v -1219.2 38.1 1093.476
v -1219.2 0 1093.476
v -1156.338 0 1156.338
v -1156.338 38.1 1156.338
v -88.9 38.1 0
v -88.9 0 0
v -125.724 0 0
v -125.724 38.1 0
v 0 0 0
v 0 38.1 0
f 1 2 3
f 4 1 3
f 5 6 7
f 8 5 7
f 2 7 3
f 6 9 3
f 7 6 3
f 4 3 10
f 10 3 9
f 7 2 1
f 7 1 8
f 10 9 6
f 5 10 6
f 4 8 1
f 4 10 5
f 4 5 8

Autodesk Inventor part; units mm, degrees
ref_plane "YZ Plane" through (0, 0, 0) normal (1, 0, 0) x (0, 1, 0)
ref_plane "XZ Plane" through (0, 0, 0) normal (0, 1, 0) x (-1, 0, 0)
ref_plane "XY Plane" through (0, 0, 0) normal (0, 0, 1) x (1, 0, 0)
sketch "Sketch1" plane through (0, 0, 0) normal (0, 1, 0) x (-1, 0, 0)
  line L0 (0, 0) -> (0, -1219.2)
  line L1 (0, 0) -> (88.9, 0)
  line L2 (88.9, 0) -> (88.9, -1219.2)
  line L3 (88.9, -1219.2) -> (0, -1219.2)
  line L4 (0, 0) -> (0, 1219.2) construction
  line L5 (0, 1219.2) -> (1219.2, 1219.2) construction
  line L6 (0, 1219.2) -> (0, 3657.6) construction
  line L7 (0, 3657.6) -> (0, 4876.8) construction
  line L8 (0, 4876.8) -> (0, 6096) construction
  line L9 (0, -1219.2) -> (2438.4, -1219.2) construction
  line L10 (0, 6096) -> (2438.4, 6096) construction
  line L11 (2438.4, 6096) -> (2438.4, -1219.2) construction
  line L12 (0, 3657.6) -> (0, 3352.8) construction
  line L13 (0, 3352.8) -> (2438.4, 3352.8) construction
  line L14 (2438.4, 3352.8) -> (1219.2, 3352.8)
  line L15 (1219.2, 3352.8) -> (1219.2, 3263.9)
  line L16 (1219.2, 3263.9) -> (2438.4, 3263.9)
  line L17 (2438.4, 3263.9) -> (2438.4, 3352.8)
  line L18 (0, 6096) -> (862.1046, 6958.1046)
  line L19 (862.1046, 6958.1046) -> (924.9664, 6895.2428)
  line L20 (924.9664, 6895.2428) -> (62.8618, 6033.1382)
  line L21 (62.8618, 6033.1382) -> (0, 6096)
  line L22 (0, 4876.8) -> (1219.2, 4876.8) construction
  line L23 (1219.2, 4876.8) -> (2081.3046, 5738.9046)
  line L24 (1219.2, 1219.2) -> (2081.3046, 357.0954)
  line L25 (2081.3046, 357.0954) -> (2018.4428, 294.2336)
  line L26 (2018.4428, 294.2336) -> (1156.3382, 1156.3382)
  line L27 (1156.3382, 1156.3382) -> (1219.2, 1219.2)
  line L28 (2018.4428, 294.2336) -> (88.9, -1219.2)
  line L29 (2081.3046, 357.0954) -> (2144.1664, 419.9572)
  line L30 (2144.1664, 419.9572) -> (1282.0618, 1282.0618)
  line L31 (1282.0618, 1282.0618) -> (1219.2, 1219.2)
  line L32 (2438.4, 3352.8) -> (2438.4, 3441.7)
  line L33 (2438.4, 3441.7) -> (1219.2, 3441.7)
  line L34 (1219.2, 3441.7) -> (1219.2, 3352.8)
  line L35 (1156.3382, 4939.6618) -> (1282.0618, 4813.9382)
  line L36 (2018.4428, 5801.7664) -> (2144.1664, 5676.0428)
  line L37 (1282.0618, 4813.9382) -> (2144.1664, 5676.0428)
  line L38 (2018.4428, 5801.7664) -> (1156.3382, 4939.6618)
  line L39 (2018.4428, 5801.7664) -> (924.9664, 6895.2428)
  line L40 (62.8618, 6033.1382) -> (1156.3382, 4939.6618)
  line L41 (1233.6206, 4168.8855) -> (1267.6412, 4086.7527)
  line L42 (1263.7078, 2313.9849) -> (1230.0006, 2231.7229)
  arc A0 (862.1046, 6958.1046) -> (0, 6096) centre (431.0523, 6527.0523) ccw
  line L43 (1246.8542, 2272.8539) -> (2375.0183, 1810.583)
  line L44 (2391.8719, 1851.7139) -> (2358.1646, 1769.452)
  line L45 (2391.8719, 1851.7139) -> (1263.7078, 2313.9849)
  line L46 (1230.0006, 2231.7229) -> (2358.1646, 1769.452)
  line L47 (1230.0006, 2231.7229) -> (1219.2, 3263.9)
  line L48 (2144.1664, 419.9572) -> (2391.8719, 1851.7139)
  line L49 (2391.8719, 1851.7139) -> (2438.4, 3263.9)
  line L50 (1219.2, 3441.7) -> (1233.6206, 4168.8855)
  line L51 (1250.6309, 4127.8191) -> (2377.0248, 4594.3867)
  line L52 (2360.0145, 4635.4532) -> (2394.0351, 4553.3203)
  line L53 (2394.0351, 4553.3203) -> (1267.6412, 4086.7527)
  line L54 (2360.0145, 4635.4532) -> (1233.6206, 4168.8855)
  line L55 (2394.0351, 4553.3203) -> (2144.1664, 5676.0428)
  line L56 (2438.4, 3441.7) -> (2394.0351, 4553.3203)
  line L57 (2144.1664, 5676.0428) -> (2057.3895, 5656.7301)
  line L58 (2394.0351, 4553.3203) -> (2305.2058, 4549.7751)
  line L59 (2394.0351, 4553.3203) -> (2307.2582, 4534.0076)
  line L60 (2307.2582, 4534.0076) -> (2057.3895, 5656.7301)
  line L61 (2438.4, 3441.7) -> (2349.5707, 3438.1548)
  line L62 (2349.5707, 3438.1548) -> (2305.2058, 4549.7751)
  line L63 (1219.2, 3441.7) -> (1308.0825, 3439.9374)
  line L64 (1233.6206, 4168.8855) -> (1322.5031, 4167.1229)
  line L65 (1322.5031, 4167.1229) -> (1308.0825, 3439.9374)
  line L66 (2018.4428, 5801.7664) -> (1955.581, 5738.9046)
  line L67 (1955.581, 5738.9046) -> (862.1046, 6832.381)
  line L68 (924.9664, 6895.2428) -> (862.1046, 6832.381)
  line L69 (62.8618, 6033.1382) -> (125.7236, 6096)
  line L70 (62.8618, 6033.1382) -> (125.7236, 6096)
  line L71 (125.7236, 6096) -> (1219.2, 5002.5236)
  line L72 (1156.3382, 1156.3382) -> (0, 0)
  line L73 (0, 0) -> (62.8618, -62.8618)
  line L74 (1156.3382, 1156.3382) -> (1219.2, 1093.4764)
  line L75 (1219.2, 1093.4764) -> (62.8618, -62.8618)
  line L76 (2018.4428, 294.2336) -> (1963.5776, 364.1837)
  line L77 (88.9, -1219.2) -> (34.0348, -1149.2499)
  line L78 (34.0348, -1149.2499) -> (1963.5776, 364.1837)
  line L79 (2144.1664, 419.9572) -> (2056.5677, 435.1125)
  line L80 (2391.8719, 1851.7139) -> (2304.2732, 1866.8692)
  line L81 (2391.8719, 1851.7139) -> (2303.0201, 1854.6414)
  line L82 (2304.2732, 1866.8692) -> (2056.5677, 435.1125)
  line L83 (1230.0006, 2231.7229) -> (1318.8957, 2232.6531)
  line L84 (1219.2, 3263.9) -> (1308.0951, 3264.8302)
  line L85 (1308.0951, 3264.8302) -> (1318.8957, 2232.6531)
  line L86 (2438.4, 3263.9) -> (2349.5482, 3266.8275)
  line L87 (2349.5482, 3266.8275) -> (2303.0201, 1854.6414)
  line L88 (88.9, 0) -> (125.7236, 0)
  line L89 (1233.6206, 4168.8855) -> (1219.2, 4876.8)
  line L90 (1233.6206, 4168.8855) -> (1322.5022, 4170.6961)
  line L91 (1219.2, 4876.8) -> (1308.0816, 4878.6106)
  line L92 (1308.0816, 4878.6106) -> (1322.5022, 4170.6961)
  line L93 (1282.0618, 4813.9382) -> (1309.9674, 4786.0326)
  line L94 (1267.6412, 4086.7527) -> (1318.4756, 3964.0275)
  line L95 (2360.0145, 4635.4532) -> (2374.4273, 4641.4231)
  line L96 (1230.0006, 2231.7229) -> (1219.2, 1219.2)
  line L97 (1230.0006, 2231.7229) -> (1318.8955, 2230.7747)
  line L98 (1219.2, 1219.2) -> (1308.0949, 1218.2518)
  line L99 (1308.0949, 1218.2518) -> (1318.8955, 2230.7747)
  line L100 (1282.0618, 1282.0618) -> (1309.0636, 1309.0636)
  point P0 (1770.957, 2057.4547)
  point P1 (1955.1236, 357.5528)
  point P2 (88.9, -1106.2164)
  dimension "d0" = 1219.2
  dimension "d2" = 1219.2
  dimension "d3" = 1219.2
  dimension "d16" = 2438.4
  dimension "d17" = 1219.2
  dimension "d18" = 1219.2
  dimension "d20" = 2438.4
  dimension "d21" = 304.8
  dimension "d22" = 1219.2
  dimension "d23" = 88.9
  dimension "d24" = 1219.2
  dimension "d25" = 45
  dimension "d26" = 88.9
  dimension "d27" = 1219.2
  dimension "d28" = 1219.2
  dimension "d29" = 1219.2
  dimension "d31" = 1219.2
  dimension "d32" = 88.9
  dimension "d33" = 88.9
  dimension "d34" = 88.9
  dimension "d35" = 177.8
  dimension "d36" = 177.8
  dimension "d38" = 88.9
  dimension "d39" = 88.9
  dimension "d43" = 1219.2
  dimension "d44" = 88.9
  dimension "d45" = 1219.2
  dimension "d46" = 88.9
  dimension "d47" = 88.9
  dimension "d48" = 88.9
  dimension "d49" = 88.9
  dimension "d50" = 88.9
  dimension "d51" = 88.9
  dimension "d54" = 88.9
  dimension "d55" = 88.9
  dimension "d57" = 88.9
  dimension "d58" = 88.9
  dimension "d59" = 88.9
  dimension "d60" = 88.9
  dimension "d61" = 88.9
  dimension "d64" = 88.9
  dimension "d65" = 88.9
  dimension "d66" = 88.9
  dimension "d69" = 88.9
  dimension "d70" = 88.9
  dimension "d71" = 88.9
  dimension "d72" = 88.9
extrude "Extrusion1" add sketch "Sketch1" along normal blind 38.1 contours L72 L26 L75 L88 L1
properties part number "S_2x4x64.382"
